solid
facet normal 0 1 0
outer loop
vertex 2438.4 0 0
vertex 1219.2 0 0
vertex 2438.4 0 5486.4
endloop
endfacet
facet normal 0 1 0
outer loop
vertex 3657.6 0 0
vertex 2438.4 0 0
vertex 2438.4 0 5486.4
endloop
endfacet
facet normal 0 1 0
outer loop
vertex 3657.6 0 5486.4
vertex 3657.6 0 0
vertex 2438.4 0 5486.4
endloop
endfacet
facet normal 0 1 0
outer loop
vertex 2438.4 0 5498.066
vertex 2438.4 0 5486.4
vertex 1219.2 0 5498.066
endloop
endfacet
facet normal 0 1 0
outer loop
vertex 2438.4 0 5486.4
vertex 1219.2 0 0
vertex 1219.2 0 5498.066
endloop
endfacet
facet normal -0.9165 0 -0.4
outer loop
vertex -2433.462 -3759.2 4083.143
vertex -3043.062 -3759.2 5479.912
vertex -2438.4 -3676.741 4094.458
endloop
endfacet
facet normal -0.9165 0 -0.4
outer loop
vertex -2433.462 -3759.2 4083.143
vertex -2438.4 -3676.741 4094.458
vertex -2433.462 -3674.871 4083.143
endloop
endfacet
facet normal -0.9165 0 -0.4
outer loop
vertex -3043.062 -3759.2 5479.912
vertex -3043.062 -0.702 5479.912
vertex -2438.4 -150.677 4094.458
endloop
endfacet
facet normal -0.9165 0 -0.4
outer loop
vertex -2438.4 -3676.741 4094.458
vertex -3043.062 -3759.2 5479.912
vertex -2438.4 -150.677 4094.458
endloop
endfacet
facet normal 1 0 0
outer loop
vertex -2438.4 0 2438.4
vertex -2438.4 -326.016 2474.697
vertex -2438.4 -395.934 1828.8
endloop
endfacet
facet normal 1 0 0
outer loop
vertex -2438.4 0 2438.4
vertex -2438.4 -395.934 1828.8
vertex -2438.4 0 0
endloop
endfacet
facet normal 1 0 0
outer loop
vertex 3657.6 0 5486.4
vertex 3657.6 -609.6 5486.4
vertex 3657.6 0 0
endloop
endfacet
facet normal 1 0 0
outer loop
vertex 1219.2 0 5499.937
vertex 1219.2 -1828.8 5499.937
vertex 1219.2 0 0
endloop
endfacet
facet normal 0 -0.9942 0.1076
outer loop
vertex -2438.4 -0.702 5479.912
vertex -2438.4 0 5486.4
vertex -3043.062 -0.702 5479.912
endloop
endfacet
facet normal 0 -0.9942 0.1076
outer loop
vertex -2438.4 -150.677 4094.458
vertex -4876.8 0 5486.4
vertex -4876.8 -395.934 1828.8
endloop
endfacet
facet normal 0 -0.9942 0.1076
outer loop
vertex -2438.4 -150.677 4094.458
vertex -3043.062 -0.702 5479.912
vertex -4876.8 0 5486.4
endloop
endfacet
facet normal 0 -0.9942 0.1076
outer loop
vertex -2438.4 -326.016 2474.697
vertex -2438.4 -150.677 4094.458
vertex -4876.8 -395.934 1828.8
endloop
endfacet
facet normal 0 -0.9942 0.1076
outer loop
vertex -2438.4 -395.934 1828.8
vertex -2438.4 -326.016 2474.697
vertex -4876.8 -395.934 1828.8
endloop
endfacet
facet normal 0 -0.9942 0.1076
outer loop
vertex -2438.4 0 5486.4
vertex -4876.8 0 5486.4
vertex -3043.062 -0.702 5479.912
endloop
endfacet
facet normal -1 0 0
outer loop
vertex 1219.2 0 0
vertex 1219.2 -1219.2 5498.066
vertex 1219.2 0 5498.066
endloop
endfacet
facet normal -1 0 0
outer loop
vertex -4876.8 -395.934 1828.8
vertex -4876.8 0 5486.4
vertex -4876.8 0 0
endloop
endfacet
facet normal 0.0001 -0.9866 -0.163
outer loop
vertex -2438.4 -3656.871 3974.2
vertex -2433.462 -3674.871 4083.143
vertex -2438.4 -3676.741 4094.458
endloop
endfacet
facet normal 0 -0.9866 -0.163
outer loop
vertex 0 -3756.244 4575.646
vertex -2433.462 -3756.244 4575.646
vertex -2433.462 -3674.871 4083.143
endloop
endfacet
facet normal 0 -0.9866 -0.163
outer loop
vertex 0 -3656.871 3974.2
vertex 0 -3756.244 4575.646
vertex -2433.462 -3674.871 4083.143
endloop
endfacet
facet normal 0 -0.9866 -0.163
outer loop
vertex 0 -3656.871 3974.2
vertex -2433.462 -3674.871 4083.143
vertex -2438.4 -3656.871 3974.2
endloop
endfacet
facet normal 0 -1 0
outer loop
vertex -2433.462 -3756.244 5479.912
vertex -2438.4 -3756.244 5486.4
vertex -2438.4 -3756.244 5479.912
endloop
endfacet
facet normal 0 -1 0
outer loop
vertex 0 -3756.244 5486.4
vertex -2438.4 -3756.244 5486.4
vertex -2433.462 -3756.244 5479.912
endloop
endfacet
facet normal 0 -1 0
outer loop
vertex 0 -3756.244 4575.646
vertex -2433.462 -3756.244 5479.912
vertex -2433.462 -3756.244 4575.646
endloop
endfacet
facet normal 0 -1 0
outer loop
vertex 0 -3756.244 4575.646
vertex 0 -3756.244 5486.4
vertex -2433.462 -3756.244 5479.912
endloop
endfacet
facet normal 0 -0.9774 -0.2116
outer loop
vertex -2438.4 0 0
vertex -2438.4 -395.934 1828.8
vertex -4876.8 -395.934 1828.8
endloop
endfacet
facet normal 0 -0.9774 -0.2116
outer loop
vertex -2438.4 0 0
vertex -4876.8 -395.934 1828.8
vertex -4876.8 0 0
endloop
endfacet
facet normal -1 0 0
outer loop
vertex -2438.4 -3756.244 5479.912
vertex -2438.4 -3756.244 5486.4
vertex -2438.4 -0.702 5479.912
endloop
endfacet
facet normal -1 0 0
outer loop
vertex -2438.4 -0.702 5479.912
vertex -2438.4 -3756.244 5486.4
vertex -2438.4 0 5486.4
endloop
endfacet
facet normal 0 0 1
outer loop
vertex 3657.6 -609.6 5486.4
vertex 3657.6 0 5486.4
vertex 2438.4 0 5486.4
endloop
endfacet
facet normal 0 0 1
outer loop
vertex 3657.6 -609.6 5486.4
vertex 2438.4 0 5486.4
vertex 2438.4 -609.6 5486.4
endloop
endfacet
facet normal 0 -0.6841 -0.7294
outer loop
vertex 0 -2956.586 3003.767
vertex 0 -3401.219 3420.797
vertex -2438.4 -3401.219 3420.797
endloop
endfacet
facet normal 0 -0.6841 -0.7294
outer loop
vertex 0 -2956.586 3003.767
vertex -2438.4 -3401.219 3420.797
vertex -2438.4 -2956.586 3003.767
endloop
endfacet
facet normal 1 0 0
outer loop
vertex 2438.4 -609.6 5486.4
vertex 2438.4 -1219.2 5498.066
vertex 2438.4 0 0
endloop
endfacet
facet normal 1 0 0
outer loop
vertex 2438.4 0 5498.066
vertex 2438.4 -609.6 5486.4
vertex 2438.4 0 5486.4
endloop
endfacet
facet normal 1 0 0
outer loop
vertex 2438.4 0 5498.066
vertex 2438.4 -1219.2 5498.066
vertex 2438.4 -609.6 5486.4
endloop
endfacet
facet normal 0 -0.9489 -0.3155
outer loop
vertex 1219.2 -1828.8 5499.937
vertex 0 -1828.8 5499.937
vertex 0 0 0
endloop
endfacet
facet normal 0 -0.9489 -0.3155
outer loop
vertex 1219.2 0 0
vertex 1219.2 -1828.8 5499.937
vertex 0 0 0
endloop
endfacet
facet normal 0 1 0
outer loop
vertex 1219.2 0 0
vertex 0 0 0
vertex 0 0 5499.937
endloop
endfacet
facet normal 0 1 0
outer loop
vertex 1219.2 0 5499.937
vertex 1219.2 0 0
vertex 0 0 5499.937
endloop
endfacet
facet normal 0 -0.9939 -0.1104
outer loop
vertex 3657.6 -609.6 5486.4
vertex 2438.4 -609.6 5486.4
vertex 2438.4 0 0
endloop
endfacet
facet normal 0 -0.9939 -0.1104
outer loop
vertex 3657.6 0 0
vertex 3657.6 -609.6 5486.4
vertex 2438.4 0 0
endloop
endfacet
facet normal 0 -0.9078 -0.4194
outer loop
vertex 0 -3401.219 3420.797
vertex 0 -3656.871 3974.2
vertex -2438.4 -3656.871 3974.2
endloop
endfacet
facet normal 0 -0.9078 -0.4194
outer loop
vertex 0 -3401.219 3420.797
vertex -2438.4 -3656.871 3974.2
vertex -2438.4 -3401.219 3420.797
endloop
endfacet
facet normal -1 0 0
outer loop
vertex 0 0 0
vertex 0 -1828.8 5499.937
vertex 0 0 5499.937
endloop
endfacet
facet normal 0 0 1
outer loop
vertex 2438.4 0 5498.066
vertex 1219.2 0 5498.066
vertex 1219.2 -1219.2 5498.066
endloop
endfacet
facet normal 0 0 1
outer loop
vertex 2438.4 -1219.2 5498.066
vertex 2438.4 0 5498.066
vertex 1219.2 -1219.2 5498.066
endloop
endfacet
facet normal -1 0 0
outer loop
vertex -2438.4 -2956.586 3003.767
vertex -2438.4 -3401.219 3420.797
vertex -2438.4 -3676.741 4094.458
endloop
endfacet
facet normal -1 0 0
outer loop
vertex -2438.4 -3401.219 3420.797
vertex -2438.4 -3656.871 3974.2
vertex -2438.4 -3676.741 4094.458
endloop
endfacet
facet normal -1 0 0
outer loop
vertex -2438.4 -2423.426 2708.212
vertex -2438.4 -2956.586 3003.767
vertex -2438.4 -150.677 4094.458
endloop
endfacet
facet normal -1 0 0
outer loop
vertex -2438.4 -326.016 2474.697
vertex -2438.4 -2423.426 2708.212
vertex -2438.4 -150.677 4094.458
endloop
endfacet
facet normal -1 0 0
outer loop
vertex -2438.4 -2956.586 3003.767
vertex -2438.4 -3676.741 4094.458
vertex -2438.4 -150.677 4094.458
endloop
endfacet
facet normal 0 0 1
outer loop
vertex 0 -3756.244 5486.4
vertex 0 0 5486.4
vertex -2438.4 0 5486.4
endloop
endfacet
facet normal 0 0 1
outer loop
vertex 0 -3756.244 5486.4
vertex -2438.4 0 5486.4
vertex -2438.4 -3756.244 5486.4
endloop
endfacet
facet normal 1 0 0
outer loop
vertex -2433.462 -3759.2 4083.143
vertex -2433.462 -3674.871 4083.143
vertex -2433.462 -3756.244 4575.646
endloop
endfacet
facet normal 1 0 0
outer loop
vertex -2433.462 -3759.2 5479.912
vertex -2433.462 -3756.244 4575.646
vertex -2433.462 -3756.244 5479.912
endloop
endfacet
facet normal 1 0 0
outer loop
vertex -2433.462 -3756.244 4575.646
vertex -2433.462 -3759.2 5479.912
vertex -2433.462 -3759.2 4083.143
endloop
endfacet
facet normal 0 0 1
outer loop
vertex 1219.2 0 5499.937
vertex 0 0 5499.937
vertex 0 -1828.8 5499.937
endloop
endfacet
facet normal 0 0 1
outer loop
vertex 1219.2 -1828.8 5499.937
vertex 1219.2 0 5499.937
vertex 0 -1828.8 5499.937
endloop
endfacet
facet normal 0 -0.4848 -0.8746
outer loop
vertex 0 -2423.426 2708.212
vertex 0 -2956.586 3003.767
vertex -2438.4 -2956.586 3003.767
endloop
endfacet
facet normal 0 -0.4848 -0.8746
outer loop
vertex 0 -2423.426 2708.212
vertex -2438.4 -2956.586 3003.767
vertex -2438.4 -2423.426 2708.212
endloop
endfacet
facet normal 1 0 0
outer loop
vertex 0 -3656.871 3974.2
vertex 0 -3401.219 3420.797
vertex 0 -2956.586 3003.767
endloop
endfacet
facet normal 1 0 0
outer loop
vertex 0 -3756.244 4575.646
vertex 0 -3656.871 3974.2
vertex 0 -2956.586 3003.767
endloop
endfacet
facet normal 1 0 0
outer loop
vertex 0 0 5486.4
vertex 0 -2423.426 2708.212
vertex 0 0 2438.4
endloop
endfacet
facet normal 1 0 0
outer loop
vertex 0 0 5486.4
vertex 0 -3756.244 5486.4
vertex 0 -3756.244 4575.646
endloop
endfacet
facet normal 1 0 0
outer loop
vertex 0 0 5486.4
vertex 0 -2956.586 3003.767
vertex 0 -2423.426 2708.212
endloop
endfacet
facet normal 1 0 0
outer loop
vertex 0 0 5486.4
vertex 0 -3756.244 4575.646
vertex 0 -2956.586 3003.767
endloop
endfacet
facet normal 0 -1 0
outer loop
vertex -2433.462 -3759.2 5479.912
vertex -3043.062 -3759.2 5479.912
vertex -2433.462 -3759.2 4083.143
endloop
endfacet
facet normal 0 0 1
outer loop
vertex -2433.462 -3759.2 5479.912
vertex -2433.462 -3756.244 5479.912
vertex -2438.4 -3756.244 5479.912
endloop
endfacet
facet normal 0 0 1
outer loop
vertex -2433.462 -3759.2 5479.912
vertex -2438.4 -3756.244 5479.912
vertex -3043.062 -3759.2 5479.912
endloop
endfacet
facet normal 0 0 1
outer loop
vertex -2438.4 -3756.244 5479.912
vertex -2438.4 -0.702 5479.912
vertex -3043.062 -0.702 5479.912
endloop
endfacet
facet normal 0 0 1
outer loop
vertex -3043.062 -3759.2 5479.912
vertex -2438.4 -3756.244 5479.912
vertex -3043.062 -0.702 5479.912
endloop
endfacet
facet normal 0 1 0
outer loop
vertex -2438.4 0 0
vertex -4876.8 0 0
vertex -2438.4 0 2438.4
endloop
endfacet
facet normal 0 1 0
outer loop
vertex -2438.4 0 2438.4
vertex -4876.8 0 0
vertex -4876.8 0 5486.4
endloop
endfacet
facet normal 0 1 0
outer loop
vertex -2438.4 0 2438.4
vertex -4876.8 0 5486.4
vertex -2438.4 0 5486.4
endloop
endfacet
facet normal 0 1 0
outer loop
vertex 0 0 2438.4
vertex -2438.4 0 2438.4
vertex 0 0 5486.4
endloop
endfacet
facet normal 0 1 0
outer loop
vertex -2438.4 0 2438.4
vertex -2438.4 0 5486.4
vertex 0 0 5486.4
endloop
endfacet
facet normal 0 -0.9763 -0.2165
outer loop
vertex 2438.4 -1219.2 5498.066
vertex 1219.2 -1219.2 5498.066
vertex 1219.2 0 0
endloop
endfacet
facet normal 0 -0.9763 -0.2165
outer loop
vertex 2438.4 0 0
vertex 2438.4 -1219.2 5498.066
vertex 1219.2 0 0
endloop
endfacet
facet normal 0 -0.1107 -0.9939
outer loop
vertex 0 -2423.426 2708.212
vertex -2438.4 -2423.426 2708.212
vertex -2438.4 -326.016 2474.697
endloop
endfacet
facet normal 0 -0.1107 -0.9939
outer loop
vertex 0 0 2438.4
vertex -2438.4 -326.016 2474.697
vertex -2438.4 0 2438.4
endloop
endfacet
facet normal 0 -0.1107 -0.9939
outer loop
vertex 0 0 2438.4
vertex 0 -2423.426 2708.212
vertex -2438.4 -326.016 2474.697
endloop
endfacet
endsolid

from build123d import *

# Parameters (mm, degrees)
F1_START  = 2438.4
F1_DEPTH  = 1219.2
F3_DEPTH  = 2438.4
F5_START  = 1219.2
F5_DEPTH  = 1219.2
F7_DEPTH  = 1219.2
F9_START  = -2438.4
F9_DEPTH  = 2438.4
F11_DEPTH = 3759.2


with BuildPart() as f1:
    # F0 (on Right) → F1 (new body)
    with BuildSketch(Plane.YZ.offset(F1_START)):
        Polygon((-609.6, 5486.4), (0, 0), (0, 5486.4), align=None)
    extrude(amount=F1_DEPTH)

    # F4 (on Right) → F5 (join)
    with BuildSketch(Plane.YZ.offset(F5_START)):
        Polygon((0, 0), (0, 5498.0664253235), (-1219.2, 5498.0664253235), align=None)
    extrude(amount=F5_DEPTH)


with BuildPart() as f3:
    # F2 (on Right) → F3 (new body)
    with BuildSketch(Plane.YZ):
        Polygon((-2423.4264762868, 2708.2122940714), (0, 2438.4), (0, 5486.4), (-3756.2441038375, 5486.4), (-3756.2441038375, 4575.6455188824), (-3656.8710018597, 3974.1996388539), (-3401.2188868615, 3420.7972932707), (-2956.5863139944, 3003.7672761909), align=None)
    extrude(amount=-F3_DEPTH)

    # F8 (on Right) → F9 (join)
    with BuildSketch(Plane.YZ.offset(F9_START)):
        Polygon((-395.93359828, 1828.8), (0, 0), (0, 1828.8), align=None)
        Polygon((-395.93359828, 1828.8), (0, 1828.8), (0, 5486.4), align=None)
    extrude(amount=-F9_DEPTH)

    # F10 (on Front) → F11 (join)
    with BuildSketch(Plane.XZ):
        Polygon((-3043.0619045258, 5479.9123060755), (-2433.4619045258, 4083.1432342529), (-2433.4619045258, 5479.9123060755), align=None)
    extrude(amount=F11_DEPTH)


with BuildPart() as f7:
    # F6 (on Right) → F7 (new body)
    with BuildSketch(Plane.YZ):
        Polygon((0, 0), (0, 5499.9370574951), (-1828.8, 5499.9370574951), align=None)
    extrude(amount=F7_DEPTH)


solid = Compound([f1.part, f3.part, f7.part])
